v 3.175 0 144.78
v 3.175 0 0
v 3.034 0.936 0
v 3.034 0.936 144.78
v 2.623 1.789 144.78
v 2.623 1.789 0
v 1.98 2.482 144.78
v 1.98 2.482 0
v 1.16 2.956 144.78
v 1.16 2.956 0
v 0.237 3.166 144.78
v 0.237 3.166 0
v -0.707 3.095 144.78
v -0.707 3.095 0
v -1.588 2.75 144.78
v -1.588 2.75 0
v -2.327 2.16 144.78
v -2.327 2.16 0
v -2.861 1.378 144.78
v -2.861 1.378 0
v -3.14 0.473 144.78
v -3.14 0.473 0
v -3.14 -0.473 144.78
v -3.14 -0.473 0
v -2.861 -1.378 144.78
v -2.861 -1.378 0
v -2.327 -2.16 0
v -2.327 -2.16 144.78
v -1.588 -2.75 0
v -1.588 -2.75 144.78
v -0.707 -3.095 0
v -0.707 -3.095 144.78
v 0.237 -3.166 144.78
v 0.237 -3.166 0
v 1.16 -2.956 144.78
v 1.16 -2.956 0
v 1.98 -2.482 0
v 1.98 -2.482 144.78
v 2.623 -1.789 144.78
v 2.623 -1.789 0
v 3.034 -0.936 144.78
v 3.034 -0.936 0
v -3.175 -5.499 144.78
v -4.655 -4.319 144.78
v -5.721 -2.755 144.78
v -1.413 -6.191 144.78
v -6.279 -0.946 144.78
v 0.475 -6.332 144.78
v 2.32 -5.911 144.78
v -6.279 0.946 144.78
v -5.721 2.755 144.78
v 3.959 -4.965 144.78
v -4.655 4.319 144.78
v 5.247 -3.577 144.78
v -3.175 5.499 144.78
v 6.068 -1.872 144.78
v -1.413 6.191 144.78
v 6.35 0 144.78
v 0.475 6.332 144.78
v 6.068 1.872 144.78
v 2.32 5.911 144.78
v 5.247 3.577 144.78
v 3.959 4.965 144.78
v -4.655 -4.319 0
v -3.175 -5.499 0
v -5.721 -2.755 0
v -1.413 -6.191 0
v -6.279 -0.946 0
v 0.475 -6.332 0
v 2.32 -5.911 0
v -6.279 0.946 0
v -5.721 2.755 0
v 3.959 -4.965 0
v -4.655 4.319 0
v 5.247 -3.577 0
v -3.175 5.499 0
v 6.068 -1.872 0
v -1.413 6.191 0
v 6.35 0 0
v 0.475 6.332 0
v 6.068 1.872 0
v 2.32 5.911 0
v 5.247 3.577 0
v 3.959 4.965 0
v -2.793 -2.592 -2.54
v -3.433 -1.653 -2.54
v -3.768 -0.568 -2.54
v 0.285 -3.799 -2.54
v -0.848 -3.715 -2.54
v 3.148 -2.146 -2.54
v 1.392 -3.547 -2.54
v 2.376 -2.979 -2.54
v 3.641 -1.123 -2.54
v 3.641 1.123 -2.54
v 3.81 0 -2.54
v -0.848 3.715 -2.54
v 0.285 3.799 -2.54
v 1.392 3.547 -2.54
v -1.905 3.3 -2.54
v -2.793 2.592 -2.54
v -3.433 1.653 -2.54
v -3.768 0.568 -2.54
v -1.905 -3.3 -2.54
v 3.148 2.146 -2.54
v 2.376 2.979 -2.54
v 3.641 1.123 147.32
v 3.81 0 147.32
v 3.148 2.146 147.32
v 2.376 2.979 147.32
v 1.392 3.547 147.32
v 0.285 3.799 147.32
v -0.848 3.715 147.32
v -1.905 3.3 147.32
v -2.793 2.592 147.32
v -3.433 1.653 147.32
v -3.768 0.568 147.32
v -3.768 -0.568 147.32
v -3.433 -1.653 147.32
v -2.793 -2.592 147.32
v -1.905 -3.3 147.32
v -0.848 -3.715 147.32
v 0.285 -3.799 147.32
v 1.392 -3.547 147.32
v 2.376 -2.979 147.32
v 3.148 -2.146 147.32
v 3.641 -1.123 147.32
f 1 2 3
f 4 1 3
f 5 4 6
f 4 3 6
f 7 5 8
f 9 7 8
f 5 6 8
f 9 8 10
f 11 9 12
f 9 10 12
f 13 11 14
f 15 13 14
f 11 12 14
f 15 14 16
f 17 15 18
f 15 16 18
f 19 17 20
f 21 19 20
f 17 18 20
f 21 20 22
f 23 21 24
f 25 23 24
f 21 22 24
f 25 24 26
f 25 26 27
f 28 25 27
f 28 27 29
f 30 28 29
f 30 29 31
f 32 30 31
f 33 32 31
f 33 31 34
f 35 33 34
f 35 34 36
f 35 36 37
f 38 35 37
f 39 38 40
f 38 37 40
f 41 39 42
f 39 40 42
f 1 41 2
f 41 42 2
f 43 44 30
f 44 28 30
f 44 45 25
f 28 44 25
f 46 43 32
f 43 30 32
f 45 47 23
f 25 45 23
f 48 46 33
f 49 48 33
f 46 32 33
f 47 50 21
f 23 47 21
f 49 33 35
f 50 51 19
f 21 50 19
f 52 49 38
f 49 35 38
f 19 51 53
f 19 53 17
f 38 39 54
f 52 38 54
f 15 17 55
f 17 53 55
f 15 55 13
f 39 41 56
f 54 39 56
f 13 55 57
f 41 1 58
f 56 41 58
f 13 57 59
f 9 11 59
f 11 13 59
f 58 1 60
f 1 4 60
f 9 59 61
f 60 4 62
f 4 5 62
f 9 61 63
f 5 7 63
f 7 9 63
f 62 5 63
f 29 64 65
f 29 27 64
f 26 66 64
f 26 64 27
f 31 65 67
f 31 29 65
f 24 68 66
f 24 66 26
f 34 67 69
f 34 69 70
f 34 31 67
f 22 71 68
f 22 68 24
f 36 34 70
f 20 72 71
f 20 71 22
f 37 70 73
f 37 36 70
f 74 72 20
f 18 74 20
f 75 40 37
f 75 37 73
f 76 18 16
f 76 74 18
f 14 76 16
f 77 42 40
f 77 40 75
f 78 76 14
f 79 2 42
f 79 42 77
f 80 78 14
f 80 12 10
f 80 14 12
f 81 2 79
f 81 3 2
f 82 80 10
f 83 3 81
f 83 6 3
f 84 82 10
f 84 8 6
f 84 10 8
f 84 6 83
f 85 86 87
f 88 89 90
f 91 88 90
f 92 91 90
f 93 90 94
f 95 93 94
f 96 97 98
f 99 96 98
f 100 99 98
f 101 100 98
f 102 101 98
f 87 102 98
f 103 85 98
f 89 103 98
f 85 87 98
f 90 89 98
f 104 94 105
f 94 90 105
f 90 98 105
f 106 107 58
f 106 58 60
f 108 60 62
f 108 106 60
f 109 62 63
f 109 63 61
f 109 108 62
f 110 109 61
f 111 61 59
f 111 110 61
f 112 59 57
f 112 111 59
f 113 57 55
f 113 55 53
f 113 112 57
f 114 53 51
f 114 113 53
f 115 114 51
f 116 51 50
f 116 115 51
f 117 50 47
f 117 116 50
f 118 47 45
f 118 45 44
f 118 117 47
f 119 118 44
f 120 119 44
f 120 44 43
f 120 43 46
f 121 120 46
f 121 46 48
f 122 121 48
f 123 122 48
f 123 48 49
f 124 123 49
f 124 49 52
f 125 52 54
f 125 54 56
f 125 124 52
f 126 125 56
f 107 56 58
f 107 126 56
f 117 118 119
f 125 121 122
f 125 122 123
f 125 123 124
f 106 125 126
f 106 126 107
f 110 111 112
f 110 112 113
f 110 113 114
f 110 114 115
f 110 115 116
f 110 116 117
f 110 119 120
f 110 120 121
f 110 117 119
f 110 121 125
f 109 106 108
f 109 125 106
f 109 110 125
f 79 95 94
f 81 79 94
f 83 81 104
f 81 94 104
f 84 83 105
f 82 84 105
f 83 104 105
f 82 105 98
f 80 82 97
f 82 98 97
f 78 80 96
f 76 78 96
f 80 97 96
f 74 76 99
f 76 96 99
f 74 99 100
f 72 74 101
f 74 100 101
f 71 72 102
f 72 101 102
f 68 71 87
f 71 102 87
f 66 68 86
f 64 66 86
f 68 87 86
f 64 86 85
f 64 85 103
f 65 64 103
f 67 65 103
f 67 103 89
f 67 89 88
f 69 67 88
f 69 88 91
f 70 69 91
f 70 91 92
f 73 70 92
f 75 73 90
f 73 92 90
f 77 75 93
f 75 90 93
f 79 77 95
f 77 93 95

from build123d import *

# Parameters (mm, degrees)
SKETCH1_R                = 3.175
BOSS_EXTRUDE1_DEPTH      = 144.78
SKETCH2_R                = 6.35
BOSS_EXTRUDE2_DEPTH      = 2.54
CHAMFER1_SIZE            = 2.54
CHAMFER1_OF_MIRROR1_SIZE = 2.54


with BuildPart() as part:
    # Sketch1 → Boss-Extrude1 (new body)
    with BuildSketch(Plane.XY):
        Circle(SKETCH1_R)
    extrude(amount=BOSS_EXTRUDE1_DEPTH)

    # Sketch2 → Boss-Extrude2 (add)
    with BuildSketch(Plane.XY.offset(144.78)):
        Circle(SKETCH2_R)
    boss_extrude2 = extrude(amount=BOSS_EXTRUDE2_DEPTH)

    # Chamfer1
    chamfer1_edges = [part.edges().sort_by_distance(p)[0] for p in [
        (-6.35, 0, 147.32),
    ]]
    chamfer(chamfer1_edges, length=CHAMFER1_SIZE - 0.0001)  # a hair under: the kernel refuses the full size

    # Mirror1: Boss-Extrude2 across plane
    add(boss_extrude2.mirror(Plane(origin=(0, 0, 72.39), x_dir=(1, 0, 0), z_dir=(0, 0, -1))))

    # Chamfer1 of Mirror1
    chamfer1_of_mirror1_edges = [part.edges().sort_by_distance(p)[0] for p in [
        (-6.35, 0, -2.54),
    ]]
    chamfer(chamfer1_of_mirror1_edges, length=CHAMFER1_OF_MIRROR1_SIZE - 0.0001)  # a hair under: the kernel refuses the full size


solid = part.part
